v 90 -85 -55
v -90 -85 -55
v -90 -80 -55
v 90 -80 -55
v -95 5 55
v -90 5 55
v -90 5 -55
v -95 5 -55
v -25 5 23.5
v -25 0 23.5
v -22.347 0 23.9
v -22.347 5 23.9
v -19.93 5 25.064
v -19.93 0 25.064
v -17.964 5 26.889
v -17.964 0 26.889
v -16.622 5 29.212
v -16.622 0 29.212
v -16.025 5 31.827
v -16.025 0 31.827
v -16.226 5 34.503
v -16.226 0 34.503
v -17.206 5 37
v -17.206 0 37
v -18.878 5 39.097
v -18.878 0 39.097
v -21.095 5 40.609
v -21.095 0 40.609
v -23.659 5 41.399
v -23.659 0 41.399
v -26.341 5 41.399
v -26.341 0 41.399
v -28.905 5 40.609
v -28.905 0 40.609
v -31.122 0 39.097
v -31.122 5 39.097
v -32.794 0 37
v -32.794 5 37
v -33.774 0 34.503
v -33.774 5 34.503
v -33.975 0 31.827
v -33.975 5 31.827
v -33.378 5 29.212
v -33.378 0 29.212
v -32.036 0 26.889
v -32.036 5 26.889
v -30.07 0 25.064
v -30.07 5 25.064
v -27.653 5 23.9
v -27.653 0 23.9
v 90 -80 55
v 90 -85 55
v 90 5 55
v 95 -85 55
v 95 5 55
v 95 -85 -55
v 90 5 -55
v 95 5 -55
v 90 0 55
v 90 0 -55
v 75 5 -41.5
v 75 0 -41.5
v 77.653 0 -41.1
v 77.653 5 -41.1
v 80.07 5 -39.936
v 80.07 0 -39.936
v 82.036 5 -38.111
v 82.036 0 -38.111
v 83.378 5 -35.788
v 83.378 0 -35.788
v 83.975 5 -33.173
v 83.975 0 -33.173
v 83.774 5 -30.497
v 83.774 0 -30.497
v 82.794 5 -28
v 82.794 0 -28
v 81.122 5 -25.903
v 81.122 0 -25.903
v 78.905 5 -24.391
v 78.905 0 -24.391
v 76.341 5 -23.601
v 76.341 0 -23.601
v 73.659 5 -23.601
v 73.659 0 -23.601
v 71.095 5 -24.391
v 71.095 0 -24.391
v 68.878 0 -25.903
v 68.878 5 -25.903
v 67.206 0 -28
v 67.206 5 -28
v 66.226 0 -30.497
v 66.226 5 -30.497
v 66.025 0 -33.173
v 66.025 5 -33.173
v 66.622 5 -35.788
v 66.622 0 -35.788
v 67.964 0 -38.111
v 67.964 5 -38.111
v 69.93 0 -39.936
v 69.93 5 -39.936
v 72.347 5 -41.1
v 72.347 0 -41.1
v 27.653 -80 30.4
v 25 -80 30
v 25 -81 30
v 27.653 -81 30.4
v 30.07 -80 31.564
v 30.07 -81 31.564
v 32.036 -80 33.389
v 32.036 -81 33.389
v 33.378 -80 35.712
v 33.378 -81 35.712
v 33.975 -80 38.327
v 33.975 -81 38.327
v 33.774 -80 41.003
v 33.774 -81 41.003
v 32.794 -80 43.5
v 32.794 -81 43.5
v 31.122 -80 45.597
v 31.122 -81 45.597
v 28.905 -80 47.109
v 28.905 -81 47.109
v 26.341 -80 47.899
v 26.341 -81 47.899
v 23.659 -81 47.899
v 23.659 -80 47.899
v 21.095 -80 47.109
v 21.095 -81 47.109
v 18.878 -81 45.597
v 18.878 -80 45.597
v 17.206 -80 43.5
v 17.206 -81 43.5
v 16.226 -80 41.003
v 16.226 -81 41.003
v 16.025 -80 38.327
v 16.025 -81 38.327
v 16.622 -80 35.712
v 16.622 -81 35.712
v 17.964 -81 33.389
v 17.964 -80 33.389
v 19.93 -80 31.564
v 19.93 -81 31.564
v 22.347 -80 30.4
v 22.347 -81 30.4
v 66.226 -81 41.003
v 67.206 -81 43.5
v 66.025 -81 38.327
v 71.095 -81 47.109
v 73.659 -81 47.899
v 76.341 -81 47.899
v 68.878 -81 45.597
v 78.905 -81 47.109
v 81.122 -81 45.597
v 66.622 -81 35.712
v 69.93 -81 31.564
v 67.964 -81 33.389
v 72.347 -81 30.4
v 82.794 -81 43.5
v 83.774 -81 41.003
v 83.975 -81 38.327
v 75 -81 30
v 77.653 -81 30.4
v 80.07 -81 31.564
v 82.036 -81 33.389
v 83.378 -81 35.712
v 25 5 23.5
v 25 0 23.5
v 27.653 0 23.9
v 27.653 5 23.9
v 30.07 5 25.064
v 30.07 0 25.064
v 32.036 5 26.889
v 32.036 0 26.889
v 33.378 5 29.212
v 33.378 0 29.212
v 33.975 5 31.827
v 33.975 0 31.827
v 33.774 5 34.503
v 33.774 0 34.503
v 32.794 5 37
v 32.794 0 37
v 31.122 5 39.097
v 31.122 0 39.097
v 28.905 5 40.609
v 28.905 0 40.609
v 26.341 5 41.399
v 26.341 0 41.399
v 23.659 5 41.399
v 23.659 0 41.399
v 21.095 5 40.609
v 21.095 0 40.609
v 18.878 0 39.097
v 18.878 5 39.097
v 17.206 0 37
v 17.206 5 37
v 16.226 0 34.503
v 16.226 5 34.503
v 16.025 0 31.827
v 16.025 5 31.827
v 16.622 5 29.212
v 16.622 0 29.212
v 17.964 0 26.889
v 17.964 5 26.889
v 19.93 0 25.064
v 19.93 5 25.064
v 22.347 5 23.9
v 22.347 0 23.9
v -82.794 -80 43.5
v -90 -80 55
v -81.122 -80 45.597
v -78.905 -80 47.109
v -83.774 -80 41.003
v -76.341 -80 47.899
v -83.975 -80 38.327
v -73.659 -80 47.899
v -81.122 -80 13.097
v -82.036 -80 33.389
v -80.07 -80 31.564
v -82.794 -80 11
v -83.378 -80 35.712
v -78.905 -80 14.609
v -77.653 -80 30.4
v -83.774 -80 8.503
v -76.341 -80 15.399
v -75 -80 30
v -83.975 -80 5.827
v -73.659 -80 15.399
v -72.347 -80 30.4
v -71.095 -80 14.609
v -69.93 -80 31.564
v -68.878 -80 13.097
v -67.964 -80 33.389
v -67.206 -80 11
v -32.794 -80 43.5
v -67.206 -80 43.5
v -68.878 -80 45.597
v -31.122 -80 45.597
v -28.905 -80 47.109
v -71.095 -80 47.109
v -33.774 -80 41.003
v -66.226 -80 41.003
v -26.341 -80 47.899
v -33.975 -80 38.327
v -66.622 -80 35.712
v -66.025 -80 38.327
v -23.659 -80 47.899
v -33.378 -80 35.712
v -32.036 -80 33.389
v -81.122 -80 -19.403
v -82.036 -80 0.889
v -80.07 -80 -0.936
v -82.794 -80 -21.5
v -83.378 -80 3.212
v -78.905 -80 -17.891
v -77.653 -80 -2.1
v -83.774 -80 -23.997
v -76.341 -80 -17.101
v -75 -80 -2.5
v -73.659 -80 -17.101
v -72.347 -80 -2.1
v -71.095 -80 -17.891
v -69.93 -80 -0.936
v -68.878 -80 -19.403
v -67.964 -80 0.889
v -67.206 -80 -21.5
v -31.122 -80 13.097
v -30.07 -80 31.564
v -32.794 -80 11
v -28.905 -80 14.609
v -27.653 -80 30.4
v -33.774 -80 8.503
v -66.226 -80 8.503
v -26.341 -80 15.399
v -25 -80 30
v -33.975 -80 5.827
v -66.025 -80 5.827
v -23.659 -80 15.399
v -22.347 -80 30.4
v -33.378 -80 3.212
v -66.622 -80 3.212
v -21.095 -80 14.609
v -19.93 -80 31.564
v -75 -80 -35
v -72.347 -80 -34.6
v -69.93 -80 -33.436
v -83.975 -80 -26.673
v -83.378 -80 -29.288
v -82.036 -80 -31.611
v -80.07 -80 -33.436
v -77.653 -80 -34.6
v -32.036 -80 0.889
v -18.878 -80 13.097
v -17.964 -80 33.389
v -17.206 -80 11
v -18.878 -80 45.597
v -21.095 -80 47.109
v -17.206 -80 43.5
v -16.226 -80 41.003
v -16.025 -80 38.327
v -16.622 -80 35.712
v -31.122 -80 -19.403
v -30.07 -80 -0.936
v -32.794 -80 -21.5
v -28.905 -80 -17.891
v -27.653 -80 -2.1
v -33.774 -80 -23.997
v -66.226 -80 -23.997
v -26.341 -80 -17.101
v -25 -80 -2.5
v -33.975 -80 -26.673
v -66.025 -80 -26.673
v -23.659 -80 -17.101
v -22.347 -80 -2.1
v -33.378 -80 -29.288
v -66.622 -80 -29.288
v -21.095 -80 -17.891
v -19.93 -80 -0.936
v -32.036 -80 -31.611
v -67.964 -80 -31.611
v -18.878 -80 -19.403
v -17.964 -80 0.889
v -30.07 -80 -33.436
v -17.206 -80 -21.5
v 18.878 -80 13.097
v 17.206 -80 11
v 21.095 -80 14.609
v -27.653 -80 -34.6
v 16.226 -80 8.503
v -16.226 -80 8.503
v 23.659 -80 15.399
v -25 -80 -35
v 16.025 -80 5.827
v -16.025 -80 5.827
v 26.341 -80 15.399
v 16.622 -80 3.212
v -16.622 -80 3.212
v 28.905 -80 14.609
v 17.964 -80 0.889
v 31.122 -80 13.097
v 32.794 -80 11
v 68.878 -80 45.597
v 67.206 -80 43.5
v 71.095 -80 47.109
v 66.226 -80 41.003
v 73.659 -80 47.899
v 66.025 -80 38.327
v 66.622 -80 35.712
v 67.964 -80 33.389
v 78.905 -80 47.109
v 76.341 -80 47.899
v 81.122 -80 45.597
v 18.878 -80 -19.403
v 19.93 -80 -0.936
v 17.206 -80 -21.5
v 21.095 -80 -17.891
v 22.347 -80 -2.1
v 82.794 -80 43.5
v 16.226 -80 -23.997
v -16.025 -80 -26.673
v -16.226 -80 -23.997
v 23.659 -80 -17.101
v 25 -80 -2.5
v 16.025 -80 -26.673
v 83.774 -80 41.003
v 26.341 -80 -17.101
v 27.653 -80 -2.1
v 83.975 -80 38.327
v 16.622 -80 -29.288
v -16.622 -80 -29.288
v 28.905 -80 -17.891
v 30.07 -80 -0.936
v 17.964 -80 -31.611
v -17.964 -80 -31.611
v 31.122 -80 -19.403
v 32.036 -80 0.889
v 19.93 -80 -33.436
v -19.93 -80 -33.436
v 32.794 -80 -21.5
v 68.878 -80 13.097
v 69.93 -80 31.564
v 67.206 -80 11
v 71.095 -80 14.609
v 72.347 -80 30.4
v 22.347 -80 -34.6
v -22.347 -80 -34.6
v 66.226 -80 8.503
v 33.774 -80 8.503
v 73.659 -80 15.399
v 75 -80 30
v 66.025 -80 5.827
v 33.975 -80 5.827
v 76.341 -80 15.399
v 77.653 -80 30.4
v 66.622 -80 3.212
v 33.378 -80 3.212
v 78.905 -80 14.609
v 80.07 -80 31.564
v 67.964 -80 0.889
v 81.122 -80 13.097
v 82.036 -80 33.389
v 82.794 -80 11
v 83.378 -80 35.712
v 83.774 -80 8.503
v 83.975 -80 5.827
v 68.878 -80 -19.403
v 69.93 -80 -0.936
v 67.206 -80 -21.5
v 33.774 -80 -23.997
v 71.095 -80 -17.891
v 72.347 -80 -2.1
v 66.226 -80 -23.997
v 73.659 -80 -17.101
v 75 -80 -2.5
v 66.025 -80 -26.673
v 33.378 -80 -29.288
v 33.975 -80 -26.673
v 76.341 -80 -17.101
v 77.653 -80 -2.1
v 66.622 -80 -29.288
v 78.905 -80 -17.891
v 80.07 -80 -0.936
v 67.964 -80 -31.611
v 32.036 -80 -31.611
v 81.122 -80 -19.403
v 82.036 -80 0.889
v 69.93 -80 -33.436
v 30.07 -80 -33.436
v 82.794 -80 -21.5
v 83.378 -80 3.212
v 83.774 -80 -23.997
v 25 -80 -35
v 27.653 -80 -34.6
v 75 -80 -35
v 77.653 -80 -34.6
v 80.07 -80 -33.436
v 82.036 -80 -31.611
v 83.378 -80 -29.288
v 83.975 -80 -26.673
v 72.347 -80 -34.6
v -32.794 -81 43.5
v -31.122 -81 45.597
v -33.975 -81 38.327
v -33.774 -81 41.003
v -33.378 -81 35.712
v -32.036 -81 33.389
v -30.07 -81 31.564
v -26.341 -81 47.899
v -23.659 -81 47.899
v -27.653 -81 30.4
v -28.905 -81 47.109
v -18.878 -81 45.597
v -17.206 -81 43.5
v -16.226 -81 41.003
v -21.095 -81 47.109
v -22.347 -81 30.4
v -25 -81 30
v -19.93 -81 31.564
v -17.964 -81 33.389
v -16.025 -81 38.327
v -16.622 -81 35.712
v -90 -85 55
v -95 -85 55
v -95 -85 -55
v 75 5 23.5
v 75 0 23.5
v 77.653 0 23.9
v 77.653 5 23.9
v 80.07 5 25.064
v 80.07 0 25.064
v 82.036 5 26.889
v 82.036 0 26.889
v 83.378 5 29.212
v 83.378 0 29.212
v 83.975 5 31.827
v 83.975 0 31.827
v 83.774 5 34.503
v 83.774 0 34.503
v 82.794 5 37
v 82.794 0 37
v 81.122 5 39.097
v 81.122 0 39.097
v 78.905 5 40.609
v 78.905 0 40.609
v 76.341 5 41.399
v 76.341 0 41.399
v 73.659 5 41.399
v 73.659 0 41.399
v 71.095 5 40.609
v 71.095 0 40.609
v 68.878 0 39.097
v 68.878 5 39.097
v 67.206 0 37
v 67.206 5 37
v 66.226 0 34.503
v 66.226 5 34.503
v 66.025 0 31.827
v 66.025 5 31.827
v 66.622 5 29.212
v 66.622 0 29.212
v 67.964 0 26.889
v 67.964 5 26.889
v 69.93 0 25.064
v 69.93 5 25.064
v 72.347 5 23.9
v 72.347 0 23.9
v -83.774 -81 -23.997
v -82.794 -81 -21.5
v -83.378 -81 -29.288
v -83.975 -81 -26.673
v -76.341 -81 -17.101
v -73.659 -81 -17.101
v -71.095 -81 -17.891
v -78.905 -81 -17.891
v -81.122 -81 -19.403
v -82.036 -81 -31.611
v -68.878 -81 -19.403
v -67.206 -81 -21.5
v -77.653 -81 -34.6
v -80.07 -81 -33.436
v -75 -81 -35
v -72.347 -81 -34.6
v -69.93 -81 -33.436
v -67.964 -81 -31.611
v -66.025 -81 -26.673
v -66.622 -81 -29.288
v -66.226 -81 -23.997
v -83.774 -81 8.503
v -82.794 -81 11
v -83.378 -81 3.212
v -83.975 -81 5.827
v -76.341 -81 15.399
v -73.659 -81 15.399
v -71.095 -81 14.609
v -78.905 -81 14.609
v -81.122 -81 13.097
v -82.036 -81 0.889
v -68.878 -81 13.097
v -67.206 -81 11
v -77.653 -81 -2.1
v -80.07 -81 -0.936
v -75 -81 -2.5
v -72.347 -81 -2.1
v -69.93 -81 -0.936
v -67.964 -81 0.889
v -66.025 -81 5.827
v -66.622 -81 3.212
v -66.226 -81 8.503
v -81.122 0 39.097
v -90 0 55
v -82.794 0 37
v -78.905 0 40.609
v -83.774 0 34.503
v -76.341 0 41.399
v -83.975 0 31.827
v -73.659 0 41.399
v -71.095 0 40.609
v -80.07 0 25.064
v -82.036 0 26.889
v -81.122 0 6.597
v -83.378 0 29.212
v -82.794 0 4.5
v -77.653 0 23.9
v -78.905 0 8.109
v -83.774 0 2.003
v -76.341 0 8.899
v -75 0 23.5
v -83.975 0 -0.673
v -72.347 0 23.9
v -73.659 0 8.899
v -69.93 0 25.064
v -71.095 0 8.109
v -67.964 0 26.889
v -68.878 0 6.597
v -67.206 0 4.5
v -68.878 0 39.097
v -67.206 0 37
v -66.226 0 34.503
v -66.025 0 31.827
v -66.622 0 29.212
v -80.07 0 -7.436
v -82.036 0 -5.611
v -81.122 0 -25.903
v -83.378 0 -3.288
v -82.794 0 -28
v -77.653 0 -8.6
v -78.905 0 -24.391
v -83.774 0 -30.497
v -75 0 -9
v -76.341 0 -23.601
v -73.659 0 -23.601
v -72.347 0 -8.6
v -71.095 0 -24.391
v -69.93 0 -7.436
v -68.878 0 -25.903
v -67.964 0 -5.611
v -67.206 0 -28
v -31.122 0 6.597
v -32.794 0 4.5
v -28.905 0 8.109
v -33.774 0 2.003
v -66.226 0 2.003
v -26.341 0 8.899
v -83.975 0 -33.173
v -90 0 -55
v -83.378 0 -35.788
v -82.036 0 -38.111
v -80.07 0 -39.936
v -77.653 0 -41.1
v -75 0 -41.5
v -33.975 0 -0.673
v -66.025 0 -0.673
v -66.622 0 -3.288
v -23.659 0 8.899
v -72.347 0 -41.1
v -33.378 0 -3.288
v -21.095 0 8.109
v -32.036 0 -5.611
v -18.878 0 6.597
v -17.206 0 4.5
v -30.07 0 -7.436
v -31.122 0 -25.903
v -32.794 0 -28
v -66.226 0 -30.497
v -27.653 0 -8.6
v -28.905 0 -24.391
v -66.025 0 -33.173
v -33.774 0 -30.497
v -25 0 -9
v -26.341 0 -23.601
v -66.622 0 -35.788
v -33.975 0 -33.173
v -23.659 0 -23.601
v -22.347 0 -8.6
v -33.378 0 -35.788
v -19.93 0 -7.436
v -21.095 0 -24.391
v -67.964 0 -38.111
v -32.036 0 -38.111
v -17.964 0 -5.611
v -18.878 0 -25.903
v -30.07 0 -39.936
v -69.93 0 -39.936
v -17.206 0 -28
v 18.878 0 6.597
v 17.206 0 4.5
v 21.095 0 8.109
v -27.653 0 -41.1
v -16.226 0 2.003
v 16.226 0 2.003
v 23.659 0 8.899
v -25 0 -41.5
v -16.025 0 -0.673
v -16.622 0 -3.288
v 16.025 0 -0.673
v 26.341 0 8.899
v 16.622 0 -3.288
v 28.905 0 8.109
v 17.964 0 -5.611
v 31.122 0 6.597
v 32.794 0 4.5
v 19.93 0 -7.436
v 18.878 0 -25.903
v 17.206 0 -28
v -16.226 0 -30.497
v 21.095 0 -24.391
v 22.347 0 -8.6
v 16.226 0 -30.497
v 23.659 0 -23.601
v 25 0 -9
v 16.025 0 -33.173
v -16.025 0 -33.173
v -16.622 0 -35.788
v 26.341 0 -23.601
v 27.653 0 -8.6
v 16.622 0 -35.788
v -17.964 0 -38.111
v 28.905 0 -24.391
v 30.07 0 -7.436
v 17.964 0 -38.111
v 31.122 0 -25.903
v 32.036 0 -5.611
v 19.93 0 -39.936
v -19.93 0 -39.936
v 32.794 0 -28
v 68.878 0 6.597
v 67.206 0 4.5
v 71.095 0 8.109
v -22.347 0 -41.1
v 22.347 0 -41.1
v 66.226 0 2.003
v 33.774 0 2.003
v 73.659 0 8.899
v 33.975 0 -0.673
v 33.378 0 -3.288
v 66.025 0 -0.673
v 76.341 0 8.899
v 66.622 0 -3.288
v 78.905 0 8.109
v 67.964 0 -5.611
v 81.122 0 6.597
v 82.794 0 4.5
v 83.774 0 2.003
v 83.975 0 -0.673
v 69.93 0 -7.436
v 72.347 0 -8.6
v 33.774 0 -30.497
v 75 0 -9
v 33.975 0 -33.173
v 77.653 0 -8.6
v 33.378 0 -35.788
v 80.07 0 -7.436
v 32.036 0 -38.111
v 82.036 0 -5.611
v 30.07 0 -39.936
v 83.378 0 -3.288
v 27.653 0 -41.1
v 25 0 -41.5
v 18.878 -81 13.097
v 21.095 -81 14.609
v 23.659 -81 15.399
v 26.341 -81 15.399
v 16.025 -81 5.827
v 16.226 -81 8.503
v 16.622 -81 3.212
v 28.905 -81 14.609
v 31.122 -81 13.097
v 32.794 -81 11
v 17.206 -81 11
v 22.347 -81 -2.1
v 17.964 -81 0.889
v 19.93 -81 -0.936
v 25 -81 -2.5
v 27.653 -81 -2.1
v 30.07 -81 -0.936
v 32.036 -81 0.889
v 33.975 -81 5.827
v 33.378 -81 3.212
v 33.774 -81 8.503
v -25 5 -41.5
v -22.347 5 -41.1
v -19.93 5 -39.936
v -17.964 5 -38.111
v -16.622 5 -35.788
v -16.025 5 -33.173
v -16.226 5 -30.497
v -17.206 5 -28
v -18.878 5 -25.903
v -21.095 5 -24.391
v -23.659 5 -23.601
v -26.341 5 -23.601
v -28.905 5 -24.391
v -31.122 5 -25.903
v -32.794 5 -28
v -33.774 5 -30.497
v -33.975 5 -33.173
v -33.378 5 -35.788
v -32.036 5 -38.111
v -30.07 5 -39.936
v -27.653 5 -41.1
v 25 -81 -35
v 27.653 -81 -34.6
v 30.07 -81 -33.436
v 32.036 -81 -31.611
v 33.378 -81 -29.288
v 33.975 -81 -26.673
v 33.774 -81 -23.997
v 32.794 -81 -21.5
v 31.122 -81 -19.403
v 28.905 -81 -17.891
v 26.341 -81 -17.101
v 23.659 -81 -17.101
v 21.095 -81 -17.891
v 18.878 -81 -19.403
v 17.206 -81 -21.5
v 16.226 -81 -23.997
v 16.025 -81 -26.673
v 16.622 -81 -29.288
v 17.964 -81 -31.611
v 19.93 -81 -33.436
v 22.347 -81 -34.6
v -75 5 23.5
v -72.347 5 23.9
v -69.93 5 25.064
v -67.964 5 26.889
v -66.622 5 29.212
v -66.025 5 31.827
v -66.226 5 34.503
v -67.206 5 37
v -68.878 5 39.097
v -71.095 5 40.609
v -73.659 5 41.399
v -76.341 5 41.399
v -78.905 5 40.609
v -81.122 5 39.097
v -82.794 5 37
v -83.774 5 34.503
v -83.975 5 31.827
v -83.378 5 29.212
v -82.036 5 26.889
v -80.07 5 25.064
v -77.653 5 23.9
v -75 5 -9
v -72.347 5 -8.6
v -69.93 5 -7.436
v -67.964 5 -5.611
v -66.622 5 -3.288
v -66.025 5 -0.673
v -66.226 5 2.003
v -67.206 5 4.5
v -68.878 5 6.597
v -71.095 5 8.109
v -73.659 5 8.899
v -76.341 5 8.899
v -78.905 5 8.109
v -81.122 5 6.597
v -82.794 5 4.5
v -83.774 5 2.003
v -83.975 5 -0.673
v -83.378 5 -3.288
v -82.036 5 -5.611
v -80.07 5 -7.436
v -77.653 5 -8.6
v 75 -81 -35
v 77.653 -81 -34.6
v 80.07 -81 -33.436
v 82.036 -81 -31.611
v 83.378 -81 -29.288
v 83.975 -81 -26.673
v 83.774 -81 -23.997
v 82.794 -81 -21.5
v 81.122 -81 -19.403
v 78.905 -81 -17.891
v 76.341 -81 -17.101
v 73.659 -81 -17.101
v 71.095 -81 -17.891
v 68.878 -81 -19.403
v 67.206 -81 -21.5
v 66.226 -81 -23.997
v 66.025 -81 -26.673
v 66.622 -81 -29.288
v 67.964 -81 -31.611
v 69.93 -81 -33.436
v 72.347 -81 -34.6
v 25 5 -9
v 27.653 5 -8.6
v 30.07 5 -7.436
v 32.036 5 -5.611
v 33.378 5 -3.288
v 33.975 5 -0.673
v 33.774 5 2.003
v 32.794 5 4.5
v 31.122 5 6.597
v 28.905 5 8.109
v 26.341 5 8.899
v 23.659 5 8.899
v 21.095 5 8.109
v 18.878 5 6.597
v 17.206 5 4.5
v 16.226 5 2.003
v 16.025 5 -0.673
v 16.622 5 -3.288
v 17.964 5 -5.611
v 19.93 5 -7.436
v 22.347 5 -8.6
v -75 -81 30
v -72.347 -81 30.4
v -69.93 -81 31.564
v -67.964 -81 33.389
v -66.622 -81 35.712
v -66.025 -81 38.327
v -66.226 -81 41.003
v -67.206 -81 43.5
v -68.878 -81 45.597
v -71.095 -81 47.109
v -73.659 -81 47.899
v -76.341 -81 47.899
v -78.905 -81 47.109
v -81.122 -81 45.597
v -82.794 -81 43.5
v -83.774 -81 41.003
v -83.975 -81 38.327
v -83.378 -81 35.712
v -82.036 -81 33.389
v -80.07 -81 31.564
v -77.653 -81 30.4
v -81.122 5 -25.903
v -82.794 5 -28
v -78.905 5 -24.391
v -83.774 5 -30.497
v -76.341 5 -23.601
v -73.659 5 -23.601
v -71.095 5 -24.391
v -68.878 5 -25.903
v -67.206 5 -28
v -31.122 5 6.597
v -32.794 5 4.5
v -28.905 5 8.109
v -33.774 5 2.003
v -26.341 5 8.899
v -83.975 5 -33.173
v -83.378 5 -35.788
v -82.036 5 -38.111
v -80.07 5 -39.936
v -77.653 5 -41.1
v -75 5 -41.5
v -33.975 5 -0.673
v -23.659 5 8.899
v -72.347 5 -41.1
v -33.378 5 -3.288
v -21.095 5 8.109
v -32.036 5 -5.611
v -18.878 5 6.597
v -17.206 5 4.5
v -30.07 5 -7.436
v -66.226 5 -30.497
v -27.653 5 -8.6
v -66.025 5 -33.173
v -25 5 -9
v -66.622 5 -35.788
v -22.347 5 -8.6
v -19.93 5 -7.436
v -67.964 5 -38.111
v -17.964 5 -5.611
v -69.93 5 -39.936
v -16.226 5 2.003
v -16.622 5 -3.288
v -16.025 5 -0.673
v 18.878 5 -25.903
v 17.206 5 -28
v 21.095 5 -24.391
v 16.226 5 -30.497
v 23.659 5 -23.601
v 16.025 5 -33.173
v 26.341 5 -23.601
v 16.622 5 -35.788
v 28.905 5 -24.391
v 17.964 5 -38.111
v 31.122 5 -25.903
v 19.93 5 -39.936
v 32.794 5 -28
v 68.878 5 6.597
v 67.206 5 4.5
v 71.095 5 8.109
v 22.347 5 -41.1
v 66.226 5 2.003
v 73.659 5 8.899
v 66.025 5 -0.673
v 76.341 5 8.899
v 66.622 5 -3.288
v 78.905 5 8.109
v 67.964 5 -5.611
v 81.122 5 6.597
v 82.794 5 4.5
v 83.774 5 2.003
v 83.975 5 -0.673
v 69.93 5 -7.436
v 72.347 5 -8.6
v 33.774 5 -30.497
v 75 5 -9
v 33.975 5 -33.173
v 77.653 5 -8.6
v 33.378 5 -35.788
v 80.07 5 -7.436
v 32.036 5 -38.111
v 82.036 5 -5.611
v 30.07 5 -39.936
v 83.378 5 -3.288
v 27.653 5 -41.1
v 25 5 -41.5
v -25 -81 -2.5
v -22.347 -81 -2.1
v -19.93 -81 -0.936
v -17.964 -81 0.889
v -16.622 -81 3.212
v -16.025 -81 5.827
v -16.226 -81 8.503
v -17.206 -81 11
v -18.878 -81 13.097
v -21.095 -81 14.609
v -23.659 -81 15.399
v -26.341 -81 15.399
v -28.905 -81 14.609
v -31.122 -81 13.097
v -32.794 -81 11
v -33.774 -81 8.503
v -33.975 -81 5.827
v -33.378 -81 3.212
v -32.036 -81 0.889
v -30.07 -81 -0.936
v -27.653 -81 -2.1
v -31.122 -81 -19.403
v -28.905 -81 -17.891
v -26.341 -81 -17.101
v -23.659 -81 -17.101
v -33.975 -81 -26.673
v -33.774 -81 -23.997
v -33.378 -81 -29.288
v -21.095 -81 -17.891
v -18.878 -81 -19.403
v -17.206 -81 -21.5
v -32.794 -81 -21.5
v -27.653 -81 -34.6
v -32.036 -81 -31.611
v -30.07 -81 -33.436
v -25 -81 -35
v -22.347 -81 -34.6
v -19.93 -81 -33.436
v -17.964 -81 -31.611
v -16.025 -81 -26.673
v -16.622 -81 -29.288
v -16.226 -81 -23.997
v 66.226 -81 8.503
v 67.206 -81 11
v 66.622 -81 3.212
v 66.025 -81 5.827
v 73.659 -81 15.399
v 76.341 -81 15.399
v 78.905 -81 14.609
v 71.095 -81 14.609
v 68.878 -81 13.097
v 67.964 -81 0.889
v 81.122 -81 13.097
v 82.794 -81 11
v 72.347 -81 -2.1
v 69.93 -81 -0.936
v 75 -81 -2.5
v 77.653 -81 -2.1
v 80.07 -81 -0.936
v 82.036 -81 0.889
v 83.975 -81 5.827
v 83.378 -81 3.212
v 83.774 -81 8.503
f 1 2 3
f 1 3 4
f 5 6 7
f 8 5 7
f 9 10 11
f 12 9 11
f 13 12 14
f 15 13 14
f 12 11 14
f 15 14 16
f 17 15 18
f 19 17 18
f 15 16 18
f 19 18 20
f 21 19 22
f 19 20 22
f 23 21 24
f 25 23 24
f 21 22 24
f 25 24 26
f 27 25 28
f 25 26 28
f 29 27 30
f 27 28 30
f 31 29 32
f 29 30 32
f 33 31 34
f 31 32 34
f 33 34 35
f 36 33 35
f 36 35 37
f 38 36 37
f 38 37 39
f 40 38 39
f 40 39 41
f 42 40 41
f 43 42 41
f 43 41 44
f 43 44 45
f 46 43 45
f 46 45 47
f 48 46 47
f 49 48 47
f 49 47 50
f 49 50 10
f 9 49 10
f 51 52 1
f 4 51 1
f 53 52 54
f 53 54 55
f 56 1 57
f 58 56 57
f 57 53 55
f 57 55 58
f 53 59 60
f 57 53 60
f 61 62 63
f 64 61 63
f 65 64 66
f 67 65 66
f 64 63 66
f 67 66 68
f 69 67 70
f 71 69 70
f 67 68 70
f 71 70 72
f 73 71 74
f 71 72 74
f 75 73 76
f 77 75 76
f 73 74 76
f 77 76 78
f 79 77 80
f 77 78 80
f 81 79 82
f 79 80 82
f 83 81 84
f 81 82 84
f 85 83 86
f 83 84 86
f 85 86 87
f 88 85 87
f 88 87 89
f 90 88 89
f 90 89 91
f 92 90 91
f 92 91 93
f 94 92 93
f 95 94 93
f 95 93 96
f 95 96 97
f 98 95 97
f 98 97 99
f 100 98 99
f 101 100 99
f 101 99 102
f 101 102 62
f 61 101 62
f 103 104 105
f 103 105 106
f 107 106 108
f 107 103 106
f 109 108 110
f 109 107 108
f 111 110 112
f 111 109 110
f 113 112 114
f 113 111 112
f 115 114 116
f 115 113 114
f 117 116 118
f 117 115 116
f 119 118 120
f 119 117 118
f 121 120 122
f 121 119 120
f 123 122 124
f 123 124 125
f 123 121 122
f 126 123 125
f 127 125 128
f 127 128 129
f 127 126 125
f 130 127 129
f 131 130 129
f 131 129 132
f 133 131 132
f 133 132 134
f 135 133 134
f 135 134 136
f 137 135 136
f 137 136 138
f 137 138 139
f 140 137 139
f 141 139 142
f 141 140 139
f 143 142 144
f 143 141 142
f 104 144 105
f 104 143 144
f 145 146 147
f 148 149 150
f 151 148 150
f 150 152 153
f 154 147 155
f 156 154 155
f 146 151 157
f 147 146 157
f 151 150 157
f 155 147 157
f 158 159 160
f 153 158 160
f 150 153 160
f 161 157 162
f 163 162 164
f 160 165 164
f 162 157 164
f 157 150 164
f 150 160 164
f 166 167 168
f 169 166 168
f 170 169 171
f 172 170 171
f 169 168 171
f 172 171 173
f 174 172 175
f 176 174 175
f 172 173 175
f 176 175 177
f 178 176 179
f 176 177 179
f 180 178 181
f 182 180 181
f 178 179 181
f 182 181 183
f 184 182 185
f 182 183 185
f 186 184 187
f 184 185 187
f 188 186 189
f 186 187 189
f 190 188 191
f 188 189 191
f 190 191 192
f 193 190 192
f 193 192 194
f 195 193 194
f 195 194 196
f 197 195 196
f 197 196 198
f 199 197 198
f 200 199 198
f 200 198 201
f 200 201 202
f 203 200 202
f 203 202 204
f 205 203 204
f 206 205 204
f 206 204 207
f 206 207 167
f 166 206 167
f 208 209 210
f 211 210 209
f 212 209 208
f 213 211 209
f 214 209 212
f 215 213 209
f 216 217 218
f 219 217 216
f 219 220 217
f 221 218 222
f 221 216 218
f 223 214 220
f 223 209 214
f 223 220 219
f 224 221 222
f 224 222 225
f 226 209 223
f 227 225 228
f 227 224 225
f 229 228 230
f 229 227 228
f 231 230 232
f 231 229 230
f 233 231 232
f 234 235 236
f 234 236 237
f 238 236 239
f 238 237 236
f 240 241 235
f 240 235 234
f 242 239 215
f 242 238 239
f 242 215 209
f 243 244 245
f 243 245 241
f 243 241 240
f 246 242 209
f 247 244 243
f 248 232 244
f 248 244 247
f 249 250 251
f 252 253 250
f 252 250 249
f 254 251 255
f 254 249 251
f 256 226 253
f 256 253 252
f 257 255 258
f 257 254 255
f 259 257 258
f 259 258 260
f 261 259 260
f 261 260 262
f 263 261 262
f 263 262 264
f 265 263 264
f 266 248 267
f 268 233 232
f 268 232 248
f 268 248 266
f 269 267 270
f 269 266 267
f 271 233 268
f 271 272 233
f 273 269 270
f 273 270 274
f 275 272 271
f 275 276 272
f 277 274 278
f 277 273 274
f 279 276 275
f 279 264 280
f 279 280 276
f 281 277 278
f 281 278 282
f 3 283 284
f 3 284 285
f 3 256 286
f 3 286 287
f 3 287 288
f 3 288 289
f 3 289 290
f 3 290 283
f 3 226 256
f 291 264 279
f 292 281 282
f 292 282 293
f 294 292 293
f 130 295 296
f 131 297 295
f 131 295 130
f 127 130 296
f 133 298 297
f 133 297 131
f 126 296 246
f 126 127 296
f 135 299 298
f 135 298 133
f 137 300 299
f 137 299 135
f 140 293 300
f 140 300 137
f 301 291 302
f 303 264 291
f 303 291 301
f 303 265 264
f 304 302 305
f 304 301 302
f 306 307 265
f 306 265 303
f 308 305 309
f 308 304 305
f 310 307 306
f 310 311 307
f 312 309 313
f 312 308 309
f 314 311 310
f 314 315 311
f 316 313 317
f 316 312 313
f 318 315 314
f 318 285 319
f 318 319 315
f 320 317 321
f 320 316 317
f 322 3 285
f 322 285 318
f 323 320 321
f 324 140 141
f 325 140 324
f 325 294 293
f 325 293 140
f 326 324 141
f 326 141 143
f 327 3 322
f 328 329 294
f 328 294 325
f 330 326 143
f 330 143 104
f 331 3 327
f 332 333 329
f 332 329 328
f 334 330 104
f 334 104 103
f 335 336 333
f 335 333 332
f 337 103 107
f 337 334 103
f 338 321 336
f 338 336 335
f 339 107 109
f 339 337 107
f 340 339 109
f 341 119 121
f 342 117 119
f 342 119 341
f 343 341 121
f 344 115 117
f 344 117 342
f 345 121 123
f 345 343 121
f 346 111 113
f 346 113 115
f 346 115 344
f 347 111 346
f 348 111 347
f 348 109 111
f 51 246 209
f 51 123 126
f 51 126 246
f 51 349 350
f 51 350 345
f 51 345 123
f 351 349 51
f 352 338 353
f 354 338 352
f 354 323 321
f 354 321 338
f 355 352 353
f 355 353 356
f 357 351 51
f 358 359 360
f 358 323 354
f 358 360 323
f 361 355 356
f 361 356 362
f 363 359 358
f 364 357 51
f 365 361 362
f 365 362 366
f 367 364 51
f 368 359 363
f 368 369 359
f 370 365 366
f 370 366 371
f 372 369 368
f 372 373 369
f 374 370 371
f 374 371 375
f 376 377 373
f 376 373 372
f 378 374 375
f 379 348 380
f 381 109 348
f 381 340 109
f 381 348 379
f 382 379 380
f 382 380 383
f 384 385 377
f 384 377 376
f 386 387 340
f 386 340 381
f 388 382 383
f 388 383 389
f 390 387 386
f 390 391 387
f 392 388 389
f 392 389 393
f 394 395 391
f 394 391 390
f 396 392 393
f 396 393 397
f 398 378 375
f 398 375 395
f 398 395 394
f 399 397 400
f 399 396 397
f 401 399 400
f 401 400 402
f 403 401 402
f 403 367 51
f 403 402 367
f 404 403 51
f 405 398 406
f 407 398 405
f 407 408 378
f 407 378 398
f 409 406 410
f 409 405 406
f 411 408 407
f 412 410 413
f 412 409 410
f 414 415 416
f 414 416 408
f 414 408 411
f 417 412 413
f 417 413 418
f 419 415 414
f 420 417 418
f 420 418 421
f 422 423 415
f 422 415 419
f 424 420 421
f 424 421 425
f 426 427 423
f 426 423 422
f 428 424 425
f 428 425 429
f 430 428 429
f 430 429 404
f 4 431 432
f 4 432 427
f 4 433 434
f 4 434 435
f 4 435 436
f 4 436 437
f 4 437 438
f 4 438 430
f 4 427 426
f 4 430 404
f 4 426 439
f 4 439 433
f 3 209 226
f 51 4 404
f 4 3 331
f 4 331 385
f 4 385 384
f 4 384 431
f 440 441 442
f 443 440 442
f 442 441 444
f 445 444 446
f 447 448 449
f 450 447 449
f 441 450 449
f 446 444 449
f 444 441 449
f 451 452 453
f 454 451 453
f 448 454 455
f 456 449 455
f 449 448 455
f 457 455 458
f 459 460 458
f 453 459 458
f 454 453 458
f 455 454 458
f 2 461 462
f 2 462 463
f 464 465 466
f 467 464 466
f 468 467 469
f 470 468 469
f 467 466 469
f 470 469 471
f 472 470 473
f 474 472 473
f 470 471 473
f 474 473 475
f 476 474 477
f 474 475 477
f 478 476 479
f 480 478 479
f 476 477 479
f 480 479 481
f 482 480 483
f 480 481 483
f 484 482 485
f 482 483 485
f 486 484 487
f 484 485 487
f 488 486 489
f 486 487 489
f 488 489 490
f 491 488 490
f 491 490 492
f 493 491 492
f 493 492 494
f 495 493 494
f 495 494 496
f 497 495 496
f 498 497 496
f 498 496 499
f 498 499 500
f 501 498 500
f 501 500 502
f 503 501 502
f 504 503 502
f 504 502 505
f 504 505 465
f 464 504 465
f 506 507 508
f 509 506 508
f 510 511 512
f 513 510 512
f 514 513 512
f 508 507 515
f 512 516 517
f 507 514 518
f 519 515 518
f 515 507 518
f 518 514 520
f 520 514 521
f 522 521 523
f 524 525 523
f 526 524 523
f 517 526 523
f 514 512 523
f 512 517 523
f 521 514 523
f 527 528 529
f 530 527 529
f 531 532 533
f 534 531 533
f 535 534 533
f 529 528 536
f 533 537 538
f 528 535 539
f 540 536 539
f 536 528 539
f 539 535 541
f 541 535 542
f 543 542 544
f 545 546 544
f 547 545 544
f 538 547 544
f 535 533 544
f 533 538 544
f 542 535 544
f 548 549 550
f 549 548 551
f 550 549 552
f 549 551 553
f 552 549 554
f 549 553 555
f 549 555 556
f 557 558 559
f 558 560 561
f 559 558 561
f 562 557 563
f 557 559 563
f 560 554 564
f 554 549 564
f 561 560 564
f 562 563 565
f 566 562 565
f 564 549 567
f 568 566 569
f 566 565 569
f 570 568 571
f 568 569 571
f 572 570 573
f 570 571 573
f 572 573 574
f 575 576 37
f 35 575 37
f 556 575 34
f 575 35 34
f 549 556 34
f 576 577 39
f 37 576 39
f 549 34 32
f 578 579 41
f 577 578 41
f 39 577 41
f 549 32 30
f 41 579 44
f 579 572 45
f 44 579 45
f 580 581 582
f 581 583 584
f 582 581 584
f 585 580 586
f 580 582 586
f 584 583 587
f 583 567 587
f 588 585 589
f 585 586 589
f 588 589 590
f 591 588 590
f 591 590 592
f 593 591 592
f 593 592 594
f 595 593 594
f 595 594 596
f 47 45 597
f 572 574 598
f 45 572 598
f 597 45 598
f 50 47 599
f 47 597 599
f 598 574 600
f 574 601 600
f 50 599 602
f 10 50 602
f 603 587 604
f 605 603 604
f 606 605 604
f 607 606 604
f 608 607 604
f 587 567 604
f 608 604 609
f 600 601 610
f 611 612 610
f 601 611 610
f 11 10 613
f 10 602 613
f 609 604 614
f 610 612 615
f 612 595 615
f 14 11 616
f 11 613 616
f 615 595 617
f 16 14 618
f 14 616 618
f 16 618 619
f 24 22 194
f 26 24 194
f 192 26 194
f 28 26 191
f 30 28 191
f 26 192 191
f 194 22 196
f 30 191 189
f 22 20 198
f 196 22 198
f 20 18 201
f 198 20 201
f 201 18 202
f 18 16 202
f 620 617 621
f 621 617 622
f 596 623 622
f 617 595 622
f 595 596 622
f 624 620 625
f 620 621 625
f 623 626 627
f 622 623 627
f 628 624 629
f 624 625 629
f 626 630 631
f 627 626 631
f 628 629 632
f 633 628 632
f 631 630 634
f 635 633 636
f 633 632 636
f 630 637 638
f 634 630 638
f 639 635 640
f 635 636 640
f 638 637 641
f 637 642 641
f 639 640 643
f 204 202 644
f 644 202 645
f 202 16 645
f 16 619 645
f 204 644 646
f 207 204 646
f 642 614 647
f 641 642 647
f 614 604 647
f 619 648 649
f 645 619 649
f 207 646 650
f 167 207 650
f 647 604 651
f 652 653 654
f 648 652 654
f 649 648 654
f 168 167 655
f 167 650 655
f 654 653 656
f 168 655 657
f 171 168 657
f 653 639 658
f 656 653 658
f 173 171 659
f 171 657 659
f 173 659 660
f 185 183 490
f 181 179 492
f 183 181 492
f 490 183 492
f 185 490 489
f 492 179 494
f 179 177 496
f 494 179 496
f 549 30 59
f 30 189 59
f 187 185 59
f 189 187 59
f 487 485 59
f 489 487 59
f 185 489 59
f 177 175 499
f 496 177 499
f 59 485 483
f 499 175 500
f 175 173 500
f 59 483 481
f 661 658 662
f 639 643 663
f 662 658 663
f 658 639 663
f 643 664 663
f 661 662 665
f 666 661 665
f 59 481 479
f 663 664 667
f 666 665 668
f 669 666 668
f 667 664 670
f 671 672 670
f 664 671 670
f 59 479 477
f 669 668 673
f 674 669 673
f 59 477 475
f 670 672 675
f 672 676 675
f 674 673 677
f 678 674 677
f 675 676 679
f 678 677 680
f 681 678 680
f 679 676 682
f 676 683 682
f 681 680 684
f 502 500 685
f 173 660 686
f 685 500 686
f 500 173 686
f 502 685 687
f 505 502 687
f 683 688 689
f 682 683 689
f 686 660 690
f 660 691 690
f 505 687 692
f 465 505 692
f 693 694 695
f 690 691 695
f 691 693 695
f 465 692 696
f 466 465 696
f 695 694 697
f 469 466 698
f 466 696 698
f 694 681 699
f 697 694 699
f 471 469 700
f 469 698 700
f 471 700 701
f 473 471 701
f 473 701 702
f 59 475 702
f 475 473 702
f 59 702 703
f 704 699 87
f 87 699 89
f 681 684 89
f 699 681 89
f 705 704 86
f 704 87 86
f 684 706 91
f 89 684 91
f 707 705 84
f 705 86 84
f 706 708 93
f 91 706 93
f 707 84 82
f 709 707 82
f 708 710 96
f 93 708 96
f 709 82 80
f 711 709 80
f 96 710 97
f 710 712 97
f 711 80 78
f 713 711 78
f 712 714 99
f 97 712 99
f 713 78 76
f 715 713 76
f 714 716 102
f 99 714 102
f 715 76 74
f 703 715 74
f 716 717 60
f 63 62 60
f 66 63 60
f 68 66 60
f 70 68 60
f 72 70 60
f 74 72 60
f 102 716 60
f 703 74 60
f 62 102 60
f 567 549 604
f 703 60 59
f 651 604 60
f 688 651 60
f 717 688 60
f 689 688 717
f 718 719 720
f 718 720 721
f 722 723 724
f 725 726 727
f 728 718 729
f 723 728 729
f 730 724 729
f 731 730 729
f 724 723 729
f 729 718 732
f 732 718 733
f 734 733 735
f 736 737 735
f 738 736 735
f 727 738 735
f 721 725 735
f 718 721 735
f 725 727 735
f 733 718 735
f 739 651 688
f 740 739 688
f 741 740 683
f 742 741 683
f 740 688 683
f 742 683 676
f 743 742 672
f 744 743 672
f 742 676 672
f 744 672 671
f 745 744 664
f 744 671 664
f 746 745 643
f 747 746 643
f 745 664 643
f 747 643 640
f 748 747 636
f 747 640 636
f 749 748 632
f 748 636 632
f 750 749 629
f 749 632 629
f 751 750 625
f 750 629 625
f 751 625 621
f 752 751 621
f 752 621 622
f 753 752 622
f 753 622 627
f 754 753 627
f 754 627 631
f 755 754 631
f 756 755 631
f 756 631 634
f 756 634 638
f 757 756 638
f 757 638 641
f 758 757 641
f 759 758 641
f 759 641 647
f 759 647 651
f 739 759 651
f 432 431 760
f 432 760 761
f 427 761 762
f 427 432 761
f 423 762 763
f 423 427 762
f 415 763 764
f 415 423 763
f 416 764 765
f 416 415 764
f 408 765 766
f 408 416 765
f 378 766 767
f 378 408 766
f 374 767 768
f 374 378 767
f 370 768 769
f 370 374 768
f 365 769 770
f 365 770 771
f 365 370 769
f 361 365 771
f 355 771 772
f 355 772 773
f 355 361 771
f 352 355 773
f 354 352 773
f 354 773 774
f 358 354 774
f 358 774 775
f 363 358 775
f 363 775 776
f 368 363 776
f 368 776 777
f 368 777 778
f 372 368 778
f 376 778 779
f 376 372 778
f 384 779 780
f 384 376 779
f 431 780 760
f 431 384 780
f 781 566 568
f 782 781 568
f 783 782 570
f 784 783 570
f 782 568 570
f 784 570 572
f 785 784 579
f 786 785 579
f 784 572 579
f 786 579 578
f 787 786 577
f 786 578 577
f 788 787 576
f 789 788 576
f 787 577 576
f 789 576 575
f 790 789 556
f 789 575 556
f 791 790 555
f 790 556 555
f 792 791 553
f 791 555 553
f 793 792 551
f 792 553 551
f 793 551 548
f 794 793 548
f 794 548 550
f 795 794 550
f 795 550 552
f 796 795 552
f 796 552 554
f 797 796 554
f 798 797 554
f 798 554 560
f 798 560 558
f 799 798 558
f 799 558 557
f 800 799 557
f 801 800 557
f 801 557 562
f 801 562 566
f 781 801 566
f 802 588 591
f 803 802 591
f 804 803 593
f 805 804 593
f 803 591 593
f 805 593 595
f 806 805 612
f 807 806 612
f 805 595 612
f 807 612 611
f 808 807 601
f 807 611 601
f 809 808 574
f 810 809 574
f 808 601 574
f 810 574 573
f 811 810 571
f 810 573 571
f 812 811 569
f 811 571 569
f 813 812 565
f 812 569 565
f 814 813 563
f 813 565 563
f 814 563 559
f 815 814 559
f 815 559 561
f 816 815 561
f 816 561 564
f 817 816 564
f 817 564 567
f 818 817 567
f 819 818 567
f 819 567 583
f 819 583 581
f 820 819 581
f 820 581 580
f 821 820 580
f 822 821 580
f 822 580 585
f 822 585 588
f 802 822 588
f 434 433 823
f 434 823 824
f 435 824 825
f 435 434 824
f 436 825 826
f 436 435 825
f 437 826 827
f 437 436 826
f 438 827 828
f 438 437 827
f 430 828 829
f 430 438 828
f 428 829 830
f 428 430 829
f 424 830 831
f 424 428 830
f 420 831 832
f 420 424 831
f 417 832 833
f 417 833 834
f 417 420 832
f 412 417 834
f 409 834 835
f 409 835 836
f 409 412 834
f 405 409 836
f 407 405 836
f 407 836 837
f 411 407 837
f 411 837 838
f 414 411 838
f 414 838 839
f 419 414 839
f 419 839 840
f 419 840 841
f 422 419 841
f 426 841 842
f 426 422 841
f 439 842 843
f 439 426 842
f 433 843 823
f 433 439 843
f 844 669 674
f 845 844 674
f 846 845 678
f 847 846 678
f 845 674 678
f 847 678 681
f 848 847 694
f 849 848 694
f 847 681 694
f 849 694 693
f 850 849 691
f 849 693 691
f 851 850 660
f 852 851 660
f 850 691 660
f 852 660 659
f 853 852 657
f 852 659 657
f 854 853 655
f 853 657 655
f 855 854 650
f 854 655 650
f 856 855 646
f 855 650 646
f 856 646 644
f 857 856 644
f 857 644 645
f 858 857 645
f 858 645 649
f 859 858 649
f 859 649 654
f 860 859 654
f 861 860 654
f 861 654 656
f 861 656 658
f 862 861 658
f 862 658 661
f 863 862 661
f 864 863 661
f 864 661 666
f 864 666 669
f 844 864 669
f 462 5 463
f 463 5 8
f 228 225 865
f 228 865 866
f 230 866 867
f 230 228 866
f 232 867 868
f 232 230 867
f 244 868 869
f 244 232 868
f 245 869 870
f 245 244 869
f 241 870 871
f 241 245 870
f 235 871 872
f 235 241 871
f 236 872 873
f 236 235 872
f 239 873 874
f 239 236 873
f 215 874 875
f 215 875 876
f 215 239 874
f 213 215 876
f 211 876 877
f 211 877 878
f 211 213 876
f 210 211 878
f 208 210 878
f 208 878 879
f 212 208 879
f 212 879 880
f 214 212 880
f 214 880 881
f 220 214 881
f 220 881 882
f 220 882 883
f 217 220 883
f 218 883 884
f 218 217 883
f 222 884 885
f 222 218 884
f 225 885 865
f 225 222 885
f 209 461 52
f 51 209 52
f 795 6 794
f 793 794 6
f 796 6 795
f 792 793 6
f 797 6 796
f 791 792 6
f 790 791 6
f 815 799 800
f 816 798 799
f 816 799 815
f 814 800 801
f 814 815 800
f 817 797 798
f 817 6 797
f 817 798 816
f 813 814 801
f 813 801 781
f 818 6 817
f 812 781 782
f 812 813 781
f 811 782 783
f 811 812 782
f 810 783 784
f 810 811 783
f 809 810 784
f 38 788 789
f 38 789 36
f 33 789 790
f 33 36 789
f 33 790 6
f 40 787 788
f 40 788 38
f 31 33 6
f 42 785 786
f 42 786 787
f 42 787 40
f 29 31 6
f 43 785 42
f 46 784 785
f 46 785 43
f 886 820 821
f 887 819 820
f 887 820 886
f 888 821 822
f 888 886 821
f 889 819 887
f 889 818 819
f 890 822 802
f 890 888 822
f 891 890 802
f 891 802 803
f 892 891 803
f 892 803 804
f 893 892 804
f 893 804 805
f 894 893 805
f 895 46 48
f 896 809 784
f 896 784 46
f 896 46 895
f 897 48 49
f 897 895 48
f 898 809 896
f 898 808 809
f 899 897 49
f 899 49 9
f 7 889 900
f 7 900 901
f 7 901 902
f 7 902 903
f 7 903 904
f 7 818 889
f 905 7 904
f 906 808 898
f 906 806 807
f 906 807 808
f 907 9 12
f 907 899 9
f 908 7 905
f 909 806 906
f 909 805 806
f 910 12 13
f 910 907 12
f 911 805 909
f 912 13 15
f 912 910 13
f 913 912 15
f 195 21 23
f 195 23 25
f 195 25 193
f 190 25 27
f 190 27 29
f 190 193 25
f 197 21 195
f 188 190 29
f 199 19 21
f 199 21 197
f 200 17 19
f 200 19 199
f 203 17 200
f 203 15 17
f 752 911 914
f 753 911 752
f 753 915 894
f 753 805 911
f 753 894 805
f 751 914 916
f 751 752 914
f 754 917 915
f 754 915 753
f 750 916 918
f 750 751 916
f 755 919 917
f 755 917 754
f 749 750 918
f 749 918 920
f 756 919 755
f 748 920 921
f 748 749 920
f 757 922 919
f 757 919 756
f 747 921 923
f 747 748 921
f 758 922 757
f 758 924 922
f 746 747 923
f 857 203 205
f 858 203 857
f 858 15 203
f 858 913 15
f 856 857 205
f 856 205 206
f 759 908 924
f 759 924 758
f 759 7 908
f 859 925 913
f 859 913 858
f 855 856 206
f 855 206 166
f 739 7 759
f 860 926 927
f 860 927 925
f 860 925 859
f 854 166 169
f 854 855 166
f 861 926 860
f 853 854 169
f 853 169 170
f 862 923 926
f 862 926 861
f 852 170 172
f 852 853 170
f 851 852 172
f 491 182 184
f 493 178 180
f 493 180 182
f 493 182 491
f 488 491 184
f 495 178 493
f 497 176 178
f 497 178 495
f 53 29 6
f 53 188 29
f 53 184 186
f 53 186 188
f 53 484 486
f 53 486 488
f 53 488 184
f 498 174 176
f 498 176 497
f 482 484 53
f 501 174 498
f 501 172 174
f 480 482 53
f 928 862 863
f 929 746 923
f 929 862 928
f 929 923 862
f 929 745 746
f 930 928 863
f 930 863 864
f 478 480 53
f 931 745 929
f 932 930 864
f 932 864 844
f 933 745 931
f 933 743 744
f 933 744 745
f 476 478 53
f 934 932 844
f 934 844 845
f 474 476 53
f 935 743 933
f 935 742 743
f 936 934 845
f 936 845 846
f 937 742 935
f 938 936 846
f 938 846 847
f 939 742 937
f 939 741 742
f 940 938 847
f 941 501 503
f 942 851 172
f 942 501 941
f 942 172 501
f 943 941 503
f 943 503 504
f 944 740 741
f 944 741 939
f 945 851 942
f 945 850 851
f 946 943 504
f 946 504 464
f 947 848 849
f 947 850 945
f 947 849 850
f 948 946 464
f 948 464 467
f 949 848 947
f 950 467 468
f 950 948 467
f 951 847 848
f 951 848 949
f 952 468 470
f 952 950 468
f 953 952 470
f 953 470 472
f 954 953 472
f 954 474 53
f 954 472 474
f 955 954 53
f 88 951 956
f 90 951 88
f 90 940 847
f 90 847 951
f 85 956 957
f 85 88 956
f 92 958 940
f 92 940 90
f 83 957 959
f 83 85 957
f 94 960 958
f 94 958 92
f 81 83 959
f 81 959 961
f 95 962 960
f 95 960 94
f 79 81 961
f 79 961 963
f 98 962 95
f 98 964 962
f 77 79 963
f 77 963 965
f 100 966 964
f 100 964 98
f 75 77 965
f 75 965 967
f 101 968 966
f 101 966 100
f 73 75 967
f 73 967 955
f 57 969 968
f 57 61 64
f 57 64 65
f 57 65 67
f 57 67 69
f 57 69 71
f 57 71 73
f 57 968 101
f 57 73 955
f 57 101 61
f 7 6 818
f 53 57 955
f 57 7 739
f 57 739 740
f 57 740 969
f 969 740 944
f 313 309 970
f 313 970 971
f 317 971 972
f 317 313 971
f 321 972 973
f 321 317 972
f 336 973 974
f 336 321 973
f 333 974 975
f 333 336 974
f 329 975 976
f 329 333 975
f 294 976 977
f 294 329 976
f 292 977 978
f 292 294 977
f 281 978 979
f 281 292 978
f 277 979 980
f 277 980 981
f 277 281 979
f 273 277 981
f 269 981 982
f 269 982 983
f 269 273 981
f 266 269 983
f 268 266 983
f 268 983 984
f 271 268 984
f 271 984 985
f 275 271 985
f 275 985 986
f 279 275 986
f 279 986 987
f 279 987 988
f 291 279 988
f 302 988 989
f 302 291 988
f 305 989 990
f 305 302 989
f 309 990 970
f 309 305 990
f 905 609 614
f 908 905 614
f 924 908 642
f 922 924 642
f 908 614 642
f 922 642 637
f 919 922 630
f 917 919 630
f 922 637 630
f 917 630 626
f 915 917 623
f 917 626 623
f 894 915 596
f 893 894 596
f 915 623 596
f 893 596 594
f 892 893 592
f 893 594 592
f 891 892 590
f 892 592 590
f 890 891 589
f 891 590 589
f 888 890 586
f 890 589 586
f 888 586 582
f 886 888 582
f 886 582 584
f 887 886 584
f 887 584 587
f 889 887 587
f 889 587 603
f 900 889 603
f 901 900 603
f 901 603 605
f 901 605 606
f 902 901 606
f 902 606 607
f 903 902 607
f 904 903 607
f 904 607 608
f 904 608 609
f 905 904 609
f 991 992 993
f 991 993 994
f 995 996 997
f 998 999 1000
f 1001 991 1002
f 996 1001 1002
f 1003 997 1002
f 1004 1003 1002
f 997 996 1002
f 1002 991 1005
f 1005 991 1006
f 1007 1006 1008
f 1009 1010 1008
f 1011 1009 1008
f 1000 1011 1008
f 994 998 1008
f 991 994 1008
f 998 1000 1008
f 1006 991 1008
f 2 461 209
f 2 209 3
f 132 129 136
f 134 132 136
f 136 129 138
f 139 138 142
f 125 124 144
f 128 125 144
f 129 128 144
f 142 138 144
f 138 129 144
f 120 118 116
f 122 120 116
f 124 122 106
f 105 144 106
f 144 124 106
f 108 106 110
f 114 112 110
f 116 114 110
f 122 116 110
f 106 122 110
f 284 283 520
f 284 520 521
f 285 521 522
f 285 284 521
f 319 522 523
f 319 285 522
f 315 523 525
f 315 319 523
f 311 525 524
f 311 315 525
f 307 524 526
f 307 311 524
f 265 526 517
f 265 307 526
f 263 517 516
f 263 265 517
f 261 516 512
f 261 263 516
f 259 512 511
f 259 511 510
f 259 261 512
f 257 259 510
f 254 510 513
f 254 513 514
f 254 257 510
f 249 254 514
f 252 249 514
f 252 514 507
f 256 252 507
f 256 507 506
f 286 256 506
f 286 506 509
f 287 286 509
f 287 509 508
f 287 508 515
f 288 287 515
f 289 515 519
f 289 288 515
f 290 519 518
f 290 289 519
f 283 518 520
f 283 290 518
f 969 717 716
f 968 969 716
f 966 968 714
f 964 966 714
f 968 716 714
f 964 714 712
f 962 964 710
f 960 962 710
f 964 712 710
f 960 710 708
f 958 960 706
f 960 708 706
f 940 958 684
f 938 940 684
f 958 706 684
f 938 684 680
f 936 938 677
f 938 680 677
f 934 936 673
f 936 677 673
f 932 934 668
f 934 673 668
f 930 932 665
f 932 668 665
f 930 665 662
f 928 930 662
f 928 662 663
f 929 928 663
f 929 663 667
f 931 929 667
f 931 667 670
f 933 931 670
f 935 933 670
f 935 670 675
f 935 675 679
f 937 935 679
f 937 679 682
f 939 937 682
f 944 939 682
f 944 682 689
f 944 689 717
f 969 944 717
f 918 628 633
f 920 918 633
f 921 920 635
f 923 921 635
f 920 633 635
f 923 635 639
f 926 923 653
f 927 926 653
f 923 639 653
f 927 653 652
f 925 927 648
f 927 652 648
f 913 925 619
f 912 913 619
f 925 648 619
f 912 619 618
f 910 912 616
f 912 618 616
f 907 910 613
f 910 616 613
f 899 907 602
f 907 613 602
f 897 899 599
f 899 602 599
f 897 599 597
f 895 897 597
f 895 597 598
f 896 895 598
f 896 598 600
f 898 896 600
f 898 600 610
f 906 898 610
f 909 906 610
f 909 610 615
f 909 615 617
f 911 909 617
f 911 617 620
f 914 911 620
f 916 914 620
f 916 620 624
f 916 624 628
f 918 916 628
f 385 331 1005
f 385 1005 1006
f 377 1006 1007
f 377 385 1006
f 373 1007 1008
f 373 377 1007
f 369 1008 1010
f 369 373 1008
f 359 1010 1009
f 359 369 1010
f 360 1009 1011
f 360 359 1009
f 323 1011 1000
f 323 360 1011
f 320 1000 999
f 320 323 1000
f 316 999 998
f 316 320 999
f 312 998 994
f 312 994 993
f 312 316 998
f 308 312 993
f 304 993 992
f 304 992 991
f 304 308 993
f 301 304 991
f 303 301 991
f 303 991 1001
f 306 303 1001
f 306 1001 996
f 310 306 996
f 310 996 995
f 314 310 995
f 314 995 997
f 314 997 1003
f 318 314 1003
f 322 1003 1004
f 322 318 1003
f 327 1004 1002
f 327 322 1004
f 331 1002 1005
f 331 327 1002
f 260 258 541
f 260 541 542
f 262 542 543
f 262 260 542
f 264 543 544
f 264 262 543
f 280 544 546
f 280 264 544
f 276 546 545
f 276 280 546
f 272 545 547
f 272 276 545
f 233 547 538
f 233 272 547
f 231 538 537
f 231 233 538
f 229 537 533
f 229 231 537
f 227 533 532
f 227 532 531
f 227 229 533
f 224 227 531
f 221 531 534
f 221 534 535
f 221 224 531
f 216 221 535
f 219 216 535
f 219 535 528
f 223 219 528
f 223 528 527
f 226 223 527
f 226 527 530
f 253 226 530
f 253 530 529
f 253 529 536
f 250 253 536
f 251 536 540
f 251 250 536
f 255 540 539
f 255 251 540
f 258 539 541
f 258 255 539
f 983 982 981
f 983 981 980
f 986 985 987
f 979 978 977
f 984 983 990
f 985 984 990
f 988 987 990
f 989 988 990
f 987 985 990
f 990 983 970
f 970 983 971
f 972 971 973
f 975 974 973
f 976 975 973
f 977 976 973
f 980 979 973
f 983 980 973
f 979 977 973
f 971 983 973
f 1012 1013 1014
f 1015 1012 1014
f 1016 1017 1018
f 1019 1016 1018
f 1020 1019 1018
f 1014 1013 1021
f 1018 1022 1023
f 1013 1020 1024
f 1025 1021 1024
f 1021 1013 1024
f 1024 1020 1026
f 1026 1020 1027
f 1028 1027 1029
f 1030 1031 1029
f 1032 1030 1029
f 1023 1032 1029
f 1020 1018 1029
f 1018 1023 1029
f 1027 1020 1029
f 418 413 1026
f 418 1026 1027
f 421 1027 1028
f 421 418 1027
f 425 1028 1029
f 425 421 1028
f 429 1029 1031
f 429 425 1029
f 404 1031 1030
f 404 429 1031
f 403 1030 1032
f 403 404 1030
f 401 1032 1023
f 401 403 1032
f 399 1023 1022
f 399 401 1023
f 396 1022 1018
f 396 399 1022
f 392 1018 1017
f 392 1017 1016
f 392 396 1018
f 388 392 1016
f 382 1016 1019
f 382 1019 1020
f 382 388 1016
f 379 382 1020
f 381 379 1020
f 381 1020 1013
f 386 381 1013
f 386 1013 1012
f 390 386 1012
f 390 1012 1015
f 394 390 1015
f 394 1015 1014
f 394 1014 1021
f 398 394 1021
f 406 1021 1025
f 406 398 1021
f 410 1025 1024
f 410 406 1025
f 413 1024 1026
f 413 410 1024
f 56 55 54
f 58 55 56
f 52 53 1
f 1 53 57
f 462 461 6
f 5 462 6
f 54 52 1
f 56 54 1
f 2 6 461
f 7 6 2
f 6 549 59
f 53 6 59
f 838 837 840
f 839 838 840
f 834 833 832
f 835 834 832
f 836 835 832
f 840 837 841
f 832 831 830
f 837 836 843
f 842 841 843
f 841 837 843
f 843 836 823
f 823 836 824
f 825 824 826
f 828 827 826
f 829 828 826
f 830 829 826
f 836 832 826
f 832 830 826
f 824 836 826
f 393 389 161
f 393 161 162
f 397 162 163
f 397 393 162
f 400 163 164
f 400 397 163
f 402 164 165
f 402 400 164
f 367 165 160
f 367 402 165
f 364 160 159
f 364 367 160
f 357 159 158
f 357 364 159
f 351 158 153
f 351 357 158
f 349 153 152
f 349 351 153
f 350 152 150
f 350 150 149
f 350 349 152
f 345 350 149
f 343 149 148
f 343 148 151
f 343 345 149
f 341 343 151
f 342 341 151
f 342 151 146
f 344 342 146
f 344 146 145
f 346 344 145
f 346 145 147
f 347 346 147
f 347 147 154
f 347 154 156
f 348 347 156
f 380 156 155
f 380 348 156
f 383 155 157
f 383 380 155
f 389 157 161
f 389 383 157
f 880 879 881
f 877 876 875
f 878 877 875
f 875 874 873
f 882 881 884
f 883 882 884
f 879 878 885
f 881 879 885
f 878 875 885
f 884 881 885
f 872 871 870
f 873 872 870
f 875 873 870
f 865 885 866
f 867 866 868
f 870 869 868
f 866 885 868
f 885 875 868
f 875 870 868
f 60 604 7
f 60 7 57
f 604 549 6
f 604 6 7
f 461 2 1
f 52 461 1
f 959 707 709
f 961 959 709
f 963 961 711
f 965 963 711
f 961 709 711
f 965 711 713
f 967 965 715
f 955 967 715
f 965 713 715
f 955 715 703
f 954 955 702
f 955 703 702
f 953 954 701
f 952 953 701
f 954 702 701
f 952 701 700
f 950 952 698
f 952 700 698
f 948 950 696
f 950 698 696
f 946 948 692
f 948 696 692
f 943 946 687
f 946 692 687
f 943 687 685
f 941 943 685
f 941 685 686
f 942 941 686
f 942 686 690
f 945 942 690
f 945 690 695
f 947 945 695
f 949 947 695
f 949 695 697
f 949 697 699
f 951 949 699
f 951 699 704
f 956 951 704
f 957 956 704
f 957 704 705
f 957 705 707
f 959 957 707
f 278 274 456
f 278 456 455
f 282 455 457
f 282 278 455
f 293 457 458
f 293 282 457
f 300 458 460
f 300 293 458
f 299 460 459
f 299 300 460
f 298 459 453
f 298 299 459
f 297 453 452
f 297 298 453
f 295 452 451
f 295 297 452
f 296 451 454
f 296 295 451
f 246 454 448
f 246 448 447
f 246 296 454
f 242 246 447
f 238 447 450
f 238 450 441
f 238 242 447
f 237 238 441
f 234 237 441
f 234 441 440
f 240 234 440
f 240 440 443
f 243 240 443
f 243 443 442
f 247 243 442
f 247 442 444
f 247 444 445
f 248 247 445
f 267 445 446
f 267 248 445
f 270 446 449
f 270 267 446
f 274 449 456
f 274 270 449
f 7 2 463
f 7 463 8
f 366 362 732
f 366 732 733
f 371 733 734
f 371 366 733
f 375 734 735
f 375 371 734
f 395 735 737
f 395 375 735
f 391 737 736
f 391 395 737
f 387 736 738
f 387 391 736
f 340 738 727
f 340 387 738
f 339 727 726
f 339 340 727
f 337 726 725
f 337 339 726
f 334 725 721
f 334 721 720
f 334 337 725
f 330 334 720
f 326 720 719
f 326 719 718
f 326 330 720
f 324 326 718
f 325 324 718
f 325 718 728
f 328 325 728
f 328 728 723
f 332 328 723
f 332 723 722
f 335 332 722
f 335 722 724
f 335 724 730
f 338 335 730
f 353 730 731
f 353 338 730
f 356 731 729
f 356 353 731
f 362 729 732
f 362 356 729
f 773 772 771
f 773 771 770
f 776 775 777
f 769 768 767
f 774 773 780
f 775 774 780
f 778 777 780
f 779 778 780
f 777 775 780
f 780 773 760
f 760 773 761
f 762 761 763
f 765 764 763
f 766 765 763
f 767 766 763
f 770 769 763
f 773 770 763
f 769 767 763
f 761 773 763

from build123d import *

# Parameters (mm, degrees)
SKETCH_1_W          = 180
SKETCH_1_H          = 110
EXTRUDE_1_DEPTH     = 5
SKETCH_2_R          = 9
CUT_EXTRUDE_4_DEPTH = 106.59356041
SKETCH_8_W          = 110
SKETCH_8_H          = 90
EXTRUDE_2_DEPTH     = 5
EXTRUDE_START       = -180
SKETCH_8_2_W        = 110
SKETCH_8_2_H        = 90
EXTRUDE_3_DEPTH     = 5
EXTRUDE_START_2     = -85
SKETCH_1_2_W        = 180
SKETCH_1_2_H        = 110
EXTRUDE_4_DEPTH     = 5
SKETCH_11_R         = 9
CUT_EXTRUDE_5_DEPTH = 1


with BuildPart() as part:
    # 草圖1 → 填料-伸長1 (new body)
    with BuildSketch(Plane(origin=(0, 0, 0), x_dir=(1, 0, 0), z_dir=(0, 1, 0))):
        Rectangle(SKETCH_1_W, SKETCH_1_H)
    extrude(amount=EXTRUDE_1_DEPTH)

    # 草圖2 → 除料-伸長4 (cut, through all)
    with BuildSketch(Plane.XZ):
        with Locations(Location((-75, 0, 0), (0, 0, 270))):
            Circle(SKETCH_2_R)
        with Locations(Location((-75, -32.5, 0), (0, 0, 270))):
            Circle(SKETCH_2_R)
        with Locations(Location((-75, 32.5, 0), (0, 0, 270))):
            Circle(SKETCH_2_R)
        with Locations(Location((-25, 32.5, 0), (0, 0, 270))):
            Circle(SKETCH_2_R)
        with Locations(Location((-25, 0, 0), (0, 0, 270))):
            Circle(SKETCH_2_R)
        with Locations(Location((-25, -32.5, 0), (0, 0, 270))):
            Circle(SKETCH_2_R)
        with Locations(Location((25, 32.5, 0), (0, 0, 270))):
            Circle(SKETCH_2_R)
        with Locations(Location((25, 0, 0), (0, 0, 270))):
            Circle(SKETCH_2_R)
        with Locations(Location((25, -32.5, 0), (0, 0, 270))):
            Circle(SKETCH_2_R)
        with Locations(Location((75, 32.5, 0), (0, 0, 270))):
            Circle(SKETCH_2_R)
        with Locations(Location((75, 0, 0), (0, 0, 270))):
            Circle(SKETCH_2_R)
        with Locations(Location((75, -32.5, 0), (0, 0, 270))):
            Circle(SKETCH_2_R)
    extrude(amount=-CUT_EXTRUDE_4_DEPTH, mode=Mode.SUBTRACT)


with BuildPart() as body_2:
    # 草圖8 → 填料-伸長2 (new body)
    with BuildSketch(Plane(origin=(90, 0, 0), x_dir=(0, 0, -1), z_dir=(1, 0, 0))):
        with Locations((0, -40)):
            Rectangle(SKETCH_8_W, SKETCH_8_H)
    extrude(amount=EXTRUDE_2_DEPTH)


with BuildPart() as body_3:
    # 草圖8<2> → 填料-伸長3 (new body)
    with BuildSketch(Plane(origin=(90, 0, 0), x_dir=(0, 0, -1), z_dir=(1, 0, 0)).offset(EXTRUDE_START)):
        with Locations((0, -40)):
            Rectangle(SKETCH_8_2_W, SKETCH_8_2_H)
    extrude(amount=-EXTRUDE_3_DEPTH)


with BuildPart() as body_4:
    # 草圖1<2> → 填料-伸長4 (new body)
    with BuildSketch(Plane(origin=(0, 0, 0), x_dir=(1, 0, 0), z_dir=(0, 1, 0)).offset(EXTRUDE_START_2)):
        Rectangle(SKETCH_1_2_W, SKETCH_1_2_H)
    extrude(amount=EXTRUDE_4_DEPTH)

    # 草圖11 → 除料-伸長5 (cut)
    with BuildSketch(Plane(origin=(0, -80, 6.5), x_dir=(1, 0, 0), z_dir=(0, -1, 0))):
        with Locations(Location((-75, 0, 0), (0, 0, 270))):
            Circle(SKETCH_11_R)
        with Locations(Location((-75, -32.5, 0), (0, 0, 270))):
            Circle(SKETCH_11_R)
        with Locations(Location((-75, 32.5, 0), (0, 0, 270))):
            Circle(SKETCH_11_R)
        with Locations(Location((-25, 32.5, 0), (0, 0, 270))):
            Circle(SKETCH_11_R)
        with Locations(Location((-25, 0, 0), (0, 0, 270))):
            Circle(SKETCH_11_R)
        with Locations(Location((-25, -32.5, 0), (0, 0, 270))):
            Circle(SKETCH_11_R)
        with Locations(Location((25, 32.5, 0), (0, 0, 270))):
            Circle(SKETCH_11_R)
        with Locations(Location((25, 0, 0), (0, 0, 270))):
            Circle(SKETCH_11_R)
        with Locations(Location((25, -32.5, 0), (0, 0, 270))):
            Circle(SKETCH_11_R)
        with Locations(Location((75, 32.5, 0), (0, 0, 270))):
            Circle(SKETCH_11_R)
        with Locations(Location((75, 0, 0), (0, 0, 270))):
            Circle(SKETCH_11_R)
        with Locations(Location((75, -32.5, 0), (0, 0, 270))):
            Circle(SKETCH_11_R)
    extrude(amount=CUT_EXTRUDE_5_DEPTH, mode=Mode.SUBTRACT)


solid = Compound([part.part, body_2.part, body_3.part, body_4.part])
